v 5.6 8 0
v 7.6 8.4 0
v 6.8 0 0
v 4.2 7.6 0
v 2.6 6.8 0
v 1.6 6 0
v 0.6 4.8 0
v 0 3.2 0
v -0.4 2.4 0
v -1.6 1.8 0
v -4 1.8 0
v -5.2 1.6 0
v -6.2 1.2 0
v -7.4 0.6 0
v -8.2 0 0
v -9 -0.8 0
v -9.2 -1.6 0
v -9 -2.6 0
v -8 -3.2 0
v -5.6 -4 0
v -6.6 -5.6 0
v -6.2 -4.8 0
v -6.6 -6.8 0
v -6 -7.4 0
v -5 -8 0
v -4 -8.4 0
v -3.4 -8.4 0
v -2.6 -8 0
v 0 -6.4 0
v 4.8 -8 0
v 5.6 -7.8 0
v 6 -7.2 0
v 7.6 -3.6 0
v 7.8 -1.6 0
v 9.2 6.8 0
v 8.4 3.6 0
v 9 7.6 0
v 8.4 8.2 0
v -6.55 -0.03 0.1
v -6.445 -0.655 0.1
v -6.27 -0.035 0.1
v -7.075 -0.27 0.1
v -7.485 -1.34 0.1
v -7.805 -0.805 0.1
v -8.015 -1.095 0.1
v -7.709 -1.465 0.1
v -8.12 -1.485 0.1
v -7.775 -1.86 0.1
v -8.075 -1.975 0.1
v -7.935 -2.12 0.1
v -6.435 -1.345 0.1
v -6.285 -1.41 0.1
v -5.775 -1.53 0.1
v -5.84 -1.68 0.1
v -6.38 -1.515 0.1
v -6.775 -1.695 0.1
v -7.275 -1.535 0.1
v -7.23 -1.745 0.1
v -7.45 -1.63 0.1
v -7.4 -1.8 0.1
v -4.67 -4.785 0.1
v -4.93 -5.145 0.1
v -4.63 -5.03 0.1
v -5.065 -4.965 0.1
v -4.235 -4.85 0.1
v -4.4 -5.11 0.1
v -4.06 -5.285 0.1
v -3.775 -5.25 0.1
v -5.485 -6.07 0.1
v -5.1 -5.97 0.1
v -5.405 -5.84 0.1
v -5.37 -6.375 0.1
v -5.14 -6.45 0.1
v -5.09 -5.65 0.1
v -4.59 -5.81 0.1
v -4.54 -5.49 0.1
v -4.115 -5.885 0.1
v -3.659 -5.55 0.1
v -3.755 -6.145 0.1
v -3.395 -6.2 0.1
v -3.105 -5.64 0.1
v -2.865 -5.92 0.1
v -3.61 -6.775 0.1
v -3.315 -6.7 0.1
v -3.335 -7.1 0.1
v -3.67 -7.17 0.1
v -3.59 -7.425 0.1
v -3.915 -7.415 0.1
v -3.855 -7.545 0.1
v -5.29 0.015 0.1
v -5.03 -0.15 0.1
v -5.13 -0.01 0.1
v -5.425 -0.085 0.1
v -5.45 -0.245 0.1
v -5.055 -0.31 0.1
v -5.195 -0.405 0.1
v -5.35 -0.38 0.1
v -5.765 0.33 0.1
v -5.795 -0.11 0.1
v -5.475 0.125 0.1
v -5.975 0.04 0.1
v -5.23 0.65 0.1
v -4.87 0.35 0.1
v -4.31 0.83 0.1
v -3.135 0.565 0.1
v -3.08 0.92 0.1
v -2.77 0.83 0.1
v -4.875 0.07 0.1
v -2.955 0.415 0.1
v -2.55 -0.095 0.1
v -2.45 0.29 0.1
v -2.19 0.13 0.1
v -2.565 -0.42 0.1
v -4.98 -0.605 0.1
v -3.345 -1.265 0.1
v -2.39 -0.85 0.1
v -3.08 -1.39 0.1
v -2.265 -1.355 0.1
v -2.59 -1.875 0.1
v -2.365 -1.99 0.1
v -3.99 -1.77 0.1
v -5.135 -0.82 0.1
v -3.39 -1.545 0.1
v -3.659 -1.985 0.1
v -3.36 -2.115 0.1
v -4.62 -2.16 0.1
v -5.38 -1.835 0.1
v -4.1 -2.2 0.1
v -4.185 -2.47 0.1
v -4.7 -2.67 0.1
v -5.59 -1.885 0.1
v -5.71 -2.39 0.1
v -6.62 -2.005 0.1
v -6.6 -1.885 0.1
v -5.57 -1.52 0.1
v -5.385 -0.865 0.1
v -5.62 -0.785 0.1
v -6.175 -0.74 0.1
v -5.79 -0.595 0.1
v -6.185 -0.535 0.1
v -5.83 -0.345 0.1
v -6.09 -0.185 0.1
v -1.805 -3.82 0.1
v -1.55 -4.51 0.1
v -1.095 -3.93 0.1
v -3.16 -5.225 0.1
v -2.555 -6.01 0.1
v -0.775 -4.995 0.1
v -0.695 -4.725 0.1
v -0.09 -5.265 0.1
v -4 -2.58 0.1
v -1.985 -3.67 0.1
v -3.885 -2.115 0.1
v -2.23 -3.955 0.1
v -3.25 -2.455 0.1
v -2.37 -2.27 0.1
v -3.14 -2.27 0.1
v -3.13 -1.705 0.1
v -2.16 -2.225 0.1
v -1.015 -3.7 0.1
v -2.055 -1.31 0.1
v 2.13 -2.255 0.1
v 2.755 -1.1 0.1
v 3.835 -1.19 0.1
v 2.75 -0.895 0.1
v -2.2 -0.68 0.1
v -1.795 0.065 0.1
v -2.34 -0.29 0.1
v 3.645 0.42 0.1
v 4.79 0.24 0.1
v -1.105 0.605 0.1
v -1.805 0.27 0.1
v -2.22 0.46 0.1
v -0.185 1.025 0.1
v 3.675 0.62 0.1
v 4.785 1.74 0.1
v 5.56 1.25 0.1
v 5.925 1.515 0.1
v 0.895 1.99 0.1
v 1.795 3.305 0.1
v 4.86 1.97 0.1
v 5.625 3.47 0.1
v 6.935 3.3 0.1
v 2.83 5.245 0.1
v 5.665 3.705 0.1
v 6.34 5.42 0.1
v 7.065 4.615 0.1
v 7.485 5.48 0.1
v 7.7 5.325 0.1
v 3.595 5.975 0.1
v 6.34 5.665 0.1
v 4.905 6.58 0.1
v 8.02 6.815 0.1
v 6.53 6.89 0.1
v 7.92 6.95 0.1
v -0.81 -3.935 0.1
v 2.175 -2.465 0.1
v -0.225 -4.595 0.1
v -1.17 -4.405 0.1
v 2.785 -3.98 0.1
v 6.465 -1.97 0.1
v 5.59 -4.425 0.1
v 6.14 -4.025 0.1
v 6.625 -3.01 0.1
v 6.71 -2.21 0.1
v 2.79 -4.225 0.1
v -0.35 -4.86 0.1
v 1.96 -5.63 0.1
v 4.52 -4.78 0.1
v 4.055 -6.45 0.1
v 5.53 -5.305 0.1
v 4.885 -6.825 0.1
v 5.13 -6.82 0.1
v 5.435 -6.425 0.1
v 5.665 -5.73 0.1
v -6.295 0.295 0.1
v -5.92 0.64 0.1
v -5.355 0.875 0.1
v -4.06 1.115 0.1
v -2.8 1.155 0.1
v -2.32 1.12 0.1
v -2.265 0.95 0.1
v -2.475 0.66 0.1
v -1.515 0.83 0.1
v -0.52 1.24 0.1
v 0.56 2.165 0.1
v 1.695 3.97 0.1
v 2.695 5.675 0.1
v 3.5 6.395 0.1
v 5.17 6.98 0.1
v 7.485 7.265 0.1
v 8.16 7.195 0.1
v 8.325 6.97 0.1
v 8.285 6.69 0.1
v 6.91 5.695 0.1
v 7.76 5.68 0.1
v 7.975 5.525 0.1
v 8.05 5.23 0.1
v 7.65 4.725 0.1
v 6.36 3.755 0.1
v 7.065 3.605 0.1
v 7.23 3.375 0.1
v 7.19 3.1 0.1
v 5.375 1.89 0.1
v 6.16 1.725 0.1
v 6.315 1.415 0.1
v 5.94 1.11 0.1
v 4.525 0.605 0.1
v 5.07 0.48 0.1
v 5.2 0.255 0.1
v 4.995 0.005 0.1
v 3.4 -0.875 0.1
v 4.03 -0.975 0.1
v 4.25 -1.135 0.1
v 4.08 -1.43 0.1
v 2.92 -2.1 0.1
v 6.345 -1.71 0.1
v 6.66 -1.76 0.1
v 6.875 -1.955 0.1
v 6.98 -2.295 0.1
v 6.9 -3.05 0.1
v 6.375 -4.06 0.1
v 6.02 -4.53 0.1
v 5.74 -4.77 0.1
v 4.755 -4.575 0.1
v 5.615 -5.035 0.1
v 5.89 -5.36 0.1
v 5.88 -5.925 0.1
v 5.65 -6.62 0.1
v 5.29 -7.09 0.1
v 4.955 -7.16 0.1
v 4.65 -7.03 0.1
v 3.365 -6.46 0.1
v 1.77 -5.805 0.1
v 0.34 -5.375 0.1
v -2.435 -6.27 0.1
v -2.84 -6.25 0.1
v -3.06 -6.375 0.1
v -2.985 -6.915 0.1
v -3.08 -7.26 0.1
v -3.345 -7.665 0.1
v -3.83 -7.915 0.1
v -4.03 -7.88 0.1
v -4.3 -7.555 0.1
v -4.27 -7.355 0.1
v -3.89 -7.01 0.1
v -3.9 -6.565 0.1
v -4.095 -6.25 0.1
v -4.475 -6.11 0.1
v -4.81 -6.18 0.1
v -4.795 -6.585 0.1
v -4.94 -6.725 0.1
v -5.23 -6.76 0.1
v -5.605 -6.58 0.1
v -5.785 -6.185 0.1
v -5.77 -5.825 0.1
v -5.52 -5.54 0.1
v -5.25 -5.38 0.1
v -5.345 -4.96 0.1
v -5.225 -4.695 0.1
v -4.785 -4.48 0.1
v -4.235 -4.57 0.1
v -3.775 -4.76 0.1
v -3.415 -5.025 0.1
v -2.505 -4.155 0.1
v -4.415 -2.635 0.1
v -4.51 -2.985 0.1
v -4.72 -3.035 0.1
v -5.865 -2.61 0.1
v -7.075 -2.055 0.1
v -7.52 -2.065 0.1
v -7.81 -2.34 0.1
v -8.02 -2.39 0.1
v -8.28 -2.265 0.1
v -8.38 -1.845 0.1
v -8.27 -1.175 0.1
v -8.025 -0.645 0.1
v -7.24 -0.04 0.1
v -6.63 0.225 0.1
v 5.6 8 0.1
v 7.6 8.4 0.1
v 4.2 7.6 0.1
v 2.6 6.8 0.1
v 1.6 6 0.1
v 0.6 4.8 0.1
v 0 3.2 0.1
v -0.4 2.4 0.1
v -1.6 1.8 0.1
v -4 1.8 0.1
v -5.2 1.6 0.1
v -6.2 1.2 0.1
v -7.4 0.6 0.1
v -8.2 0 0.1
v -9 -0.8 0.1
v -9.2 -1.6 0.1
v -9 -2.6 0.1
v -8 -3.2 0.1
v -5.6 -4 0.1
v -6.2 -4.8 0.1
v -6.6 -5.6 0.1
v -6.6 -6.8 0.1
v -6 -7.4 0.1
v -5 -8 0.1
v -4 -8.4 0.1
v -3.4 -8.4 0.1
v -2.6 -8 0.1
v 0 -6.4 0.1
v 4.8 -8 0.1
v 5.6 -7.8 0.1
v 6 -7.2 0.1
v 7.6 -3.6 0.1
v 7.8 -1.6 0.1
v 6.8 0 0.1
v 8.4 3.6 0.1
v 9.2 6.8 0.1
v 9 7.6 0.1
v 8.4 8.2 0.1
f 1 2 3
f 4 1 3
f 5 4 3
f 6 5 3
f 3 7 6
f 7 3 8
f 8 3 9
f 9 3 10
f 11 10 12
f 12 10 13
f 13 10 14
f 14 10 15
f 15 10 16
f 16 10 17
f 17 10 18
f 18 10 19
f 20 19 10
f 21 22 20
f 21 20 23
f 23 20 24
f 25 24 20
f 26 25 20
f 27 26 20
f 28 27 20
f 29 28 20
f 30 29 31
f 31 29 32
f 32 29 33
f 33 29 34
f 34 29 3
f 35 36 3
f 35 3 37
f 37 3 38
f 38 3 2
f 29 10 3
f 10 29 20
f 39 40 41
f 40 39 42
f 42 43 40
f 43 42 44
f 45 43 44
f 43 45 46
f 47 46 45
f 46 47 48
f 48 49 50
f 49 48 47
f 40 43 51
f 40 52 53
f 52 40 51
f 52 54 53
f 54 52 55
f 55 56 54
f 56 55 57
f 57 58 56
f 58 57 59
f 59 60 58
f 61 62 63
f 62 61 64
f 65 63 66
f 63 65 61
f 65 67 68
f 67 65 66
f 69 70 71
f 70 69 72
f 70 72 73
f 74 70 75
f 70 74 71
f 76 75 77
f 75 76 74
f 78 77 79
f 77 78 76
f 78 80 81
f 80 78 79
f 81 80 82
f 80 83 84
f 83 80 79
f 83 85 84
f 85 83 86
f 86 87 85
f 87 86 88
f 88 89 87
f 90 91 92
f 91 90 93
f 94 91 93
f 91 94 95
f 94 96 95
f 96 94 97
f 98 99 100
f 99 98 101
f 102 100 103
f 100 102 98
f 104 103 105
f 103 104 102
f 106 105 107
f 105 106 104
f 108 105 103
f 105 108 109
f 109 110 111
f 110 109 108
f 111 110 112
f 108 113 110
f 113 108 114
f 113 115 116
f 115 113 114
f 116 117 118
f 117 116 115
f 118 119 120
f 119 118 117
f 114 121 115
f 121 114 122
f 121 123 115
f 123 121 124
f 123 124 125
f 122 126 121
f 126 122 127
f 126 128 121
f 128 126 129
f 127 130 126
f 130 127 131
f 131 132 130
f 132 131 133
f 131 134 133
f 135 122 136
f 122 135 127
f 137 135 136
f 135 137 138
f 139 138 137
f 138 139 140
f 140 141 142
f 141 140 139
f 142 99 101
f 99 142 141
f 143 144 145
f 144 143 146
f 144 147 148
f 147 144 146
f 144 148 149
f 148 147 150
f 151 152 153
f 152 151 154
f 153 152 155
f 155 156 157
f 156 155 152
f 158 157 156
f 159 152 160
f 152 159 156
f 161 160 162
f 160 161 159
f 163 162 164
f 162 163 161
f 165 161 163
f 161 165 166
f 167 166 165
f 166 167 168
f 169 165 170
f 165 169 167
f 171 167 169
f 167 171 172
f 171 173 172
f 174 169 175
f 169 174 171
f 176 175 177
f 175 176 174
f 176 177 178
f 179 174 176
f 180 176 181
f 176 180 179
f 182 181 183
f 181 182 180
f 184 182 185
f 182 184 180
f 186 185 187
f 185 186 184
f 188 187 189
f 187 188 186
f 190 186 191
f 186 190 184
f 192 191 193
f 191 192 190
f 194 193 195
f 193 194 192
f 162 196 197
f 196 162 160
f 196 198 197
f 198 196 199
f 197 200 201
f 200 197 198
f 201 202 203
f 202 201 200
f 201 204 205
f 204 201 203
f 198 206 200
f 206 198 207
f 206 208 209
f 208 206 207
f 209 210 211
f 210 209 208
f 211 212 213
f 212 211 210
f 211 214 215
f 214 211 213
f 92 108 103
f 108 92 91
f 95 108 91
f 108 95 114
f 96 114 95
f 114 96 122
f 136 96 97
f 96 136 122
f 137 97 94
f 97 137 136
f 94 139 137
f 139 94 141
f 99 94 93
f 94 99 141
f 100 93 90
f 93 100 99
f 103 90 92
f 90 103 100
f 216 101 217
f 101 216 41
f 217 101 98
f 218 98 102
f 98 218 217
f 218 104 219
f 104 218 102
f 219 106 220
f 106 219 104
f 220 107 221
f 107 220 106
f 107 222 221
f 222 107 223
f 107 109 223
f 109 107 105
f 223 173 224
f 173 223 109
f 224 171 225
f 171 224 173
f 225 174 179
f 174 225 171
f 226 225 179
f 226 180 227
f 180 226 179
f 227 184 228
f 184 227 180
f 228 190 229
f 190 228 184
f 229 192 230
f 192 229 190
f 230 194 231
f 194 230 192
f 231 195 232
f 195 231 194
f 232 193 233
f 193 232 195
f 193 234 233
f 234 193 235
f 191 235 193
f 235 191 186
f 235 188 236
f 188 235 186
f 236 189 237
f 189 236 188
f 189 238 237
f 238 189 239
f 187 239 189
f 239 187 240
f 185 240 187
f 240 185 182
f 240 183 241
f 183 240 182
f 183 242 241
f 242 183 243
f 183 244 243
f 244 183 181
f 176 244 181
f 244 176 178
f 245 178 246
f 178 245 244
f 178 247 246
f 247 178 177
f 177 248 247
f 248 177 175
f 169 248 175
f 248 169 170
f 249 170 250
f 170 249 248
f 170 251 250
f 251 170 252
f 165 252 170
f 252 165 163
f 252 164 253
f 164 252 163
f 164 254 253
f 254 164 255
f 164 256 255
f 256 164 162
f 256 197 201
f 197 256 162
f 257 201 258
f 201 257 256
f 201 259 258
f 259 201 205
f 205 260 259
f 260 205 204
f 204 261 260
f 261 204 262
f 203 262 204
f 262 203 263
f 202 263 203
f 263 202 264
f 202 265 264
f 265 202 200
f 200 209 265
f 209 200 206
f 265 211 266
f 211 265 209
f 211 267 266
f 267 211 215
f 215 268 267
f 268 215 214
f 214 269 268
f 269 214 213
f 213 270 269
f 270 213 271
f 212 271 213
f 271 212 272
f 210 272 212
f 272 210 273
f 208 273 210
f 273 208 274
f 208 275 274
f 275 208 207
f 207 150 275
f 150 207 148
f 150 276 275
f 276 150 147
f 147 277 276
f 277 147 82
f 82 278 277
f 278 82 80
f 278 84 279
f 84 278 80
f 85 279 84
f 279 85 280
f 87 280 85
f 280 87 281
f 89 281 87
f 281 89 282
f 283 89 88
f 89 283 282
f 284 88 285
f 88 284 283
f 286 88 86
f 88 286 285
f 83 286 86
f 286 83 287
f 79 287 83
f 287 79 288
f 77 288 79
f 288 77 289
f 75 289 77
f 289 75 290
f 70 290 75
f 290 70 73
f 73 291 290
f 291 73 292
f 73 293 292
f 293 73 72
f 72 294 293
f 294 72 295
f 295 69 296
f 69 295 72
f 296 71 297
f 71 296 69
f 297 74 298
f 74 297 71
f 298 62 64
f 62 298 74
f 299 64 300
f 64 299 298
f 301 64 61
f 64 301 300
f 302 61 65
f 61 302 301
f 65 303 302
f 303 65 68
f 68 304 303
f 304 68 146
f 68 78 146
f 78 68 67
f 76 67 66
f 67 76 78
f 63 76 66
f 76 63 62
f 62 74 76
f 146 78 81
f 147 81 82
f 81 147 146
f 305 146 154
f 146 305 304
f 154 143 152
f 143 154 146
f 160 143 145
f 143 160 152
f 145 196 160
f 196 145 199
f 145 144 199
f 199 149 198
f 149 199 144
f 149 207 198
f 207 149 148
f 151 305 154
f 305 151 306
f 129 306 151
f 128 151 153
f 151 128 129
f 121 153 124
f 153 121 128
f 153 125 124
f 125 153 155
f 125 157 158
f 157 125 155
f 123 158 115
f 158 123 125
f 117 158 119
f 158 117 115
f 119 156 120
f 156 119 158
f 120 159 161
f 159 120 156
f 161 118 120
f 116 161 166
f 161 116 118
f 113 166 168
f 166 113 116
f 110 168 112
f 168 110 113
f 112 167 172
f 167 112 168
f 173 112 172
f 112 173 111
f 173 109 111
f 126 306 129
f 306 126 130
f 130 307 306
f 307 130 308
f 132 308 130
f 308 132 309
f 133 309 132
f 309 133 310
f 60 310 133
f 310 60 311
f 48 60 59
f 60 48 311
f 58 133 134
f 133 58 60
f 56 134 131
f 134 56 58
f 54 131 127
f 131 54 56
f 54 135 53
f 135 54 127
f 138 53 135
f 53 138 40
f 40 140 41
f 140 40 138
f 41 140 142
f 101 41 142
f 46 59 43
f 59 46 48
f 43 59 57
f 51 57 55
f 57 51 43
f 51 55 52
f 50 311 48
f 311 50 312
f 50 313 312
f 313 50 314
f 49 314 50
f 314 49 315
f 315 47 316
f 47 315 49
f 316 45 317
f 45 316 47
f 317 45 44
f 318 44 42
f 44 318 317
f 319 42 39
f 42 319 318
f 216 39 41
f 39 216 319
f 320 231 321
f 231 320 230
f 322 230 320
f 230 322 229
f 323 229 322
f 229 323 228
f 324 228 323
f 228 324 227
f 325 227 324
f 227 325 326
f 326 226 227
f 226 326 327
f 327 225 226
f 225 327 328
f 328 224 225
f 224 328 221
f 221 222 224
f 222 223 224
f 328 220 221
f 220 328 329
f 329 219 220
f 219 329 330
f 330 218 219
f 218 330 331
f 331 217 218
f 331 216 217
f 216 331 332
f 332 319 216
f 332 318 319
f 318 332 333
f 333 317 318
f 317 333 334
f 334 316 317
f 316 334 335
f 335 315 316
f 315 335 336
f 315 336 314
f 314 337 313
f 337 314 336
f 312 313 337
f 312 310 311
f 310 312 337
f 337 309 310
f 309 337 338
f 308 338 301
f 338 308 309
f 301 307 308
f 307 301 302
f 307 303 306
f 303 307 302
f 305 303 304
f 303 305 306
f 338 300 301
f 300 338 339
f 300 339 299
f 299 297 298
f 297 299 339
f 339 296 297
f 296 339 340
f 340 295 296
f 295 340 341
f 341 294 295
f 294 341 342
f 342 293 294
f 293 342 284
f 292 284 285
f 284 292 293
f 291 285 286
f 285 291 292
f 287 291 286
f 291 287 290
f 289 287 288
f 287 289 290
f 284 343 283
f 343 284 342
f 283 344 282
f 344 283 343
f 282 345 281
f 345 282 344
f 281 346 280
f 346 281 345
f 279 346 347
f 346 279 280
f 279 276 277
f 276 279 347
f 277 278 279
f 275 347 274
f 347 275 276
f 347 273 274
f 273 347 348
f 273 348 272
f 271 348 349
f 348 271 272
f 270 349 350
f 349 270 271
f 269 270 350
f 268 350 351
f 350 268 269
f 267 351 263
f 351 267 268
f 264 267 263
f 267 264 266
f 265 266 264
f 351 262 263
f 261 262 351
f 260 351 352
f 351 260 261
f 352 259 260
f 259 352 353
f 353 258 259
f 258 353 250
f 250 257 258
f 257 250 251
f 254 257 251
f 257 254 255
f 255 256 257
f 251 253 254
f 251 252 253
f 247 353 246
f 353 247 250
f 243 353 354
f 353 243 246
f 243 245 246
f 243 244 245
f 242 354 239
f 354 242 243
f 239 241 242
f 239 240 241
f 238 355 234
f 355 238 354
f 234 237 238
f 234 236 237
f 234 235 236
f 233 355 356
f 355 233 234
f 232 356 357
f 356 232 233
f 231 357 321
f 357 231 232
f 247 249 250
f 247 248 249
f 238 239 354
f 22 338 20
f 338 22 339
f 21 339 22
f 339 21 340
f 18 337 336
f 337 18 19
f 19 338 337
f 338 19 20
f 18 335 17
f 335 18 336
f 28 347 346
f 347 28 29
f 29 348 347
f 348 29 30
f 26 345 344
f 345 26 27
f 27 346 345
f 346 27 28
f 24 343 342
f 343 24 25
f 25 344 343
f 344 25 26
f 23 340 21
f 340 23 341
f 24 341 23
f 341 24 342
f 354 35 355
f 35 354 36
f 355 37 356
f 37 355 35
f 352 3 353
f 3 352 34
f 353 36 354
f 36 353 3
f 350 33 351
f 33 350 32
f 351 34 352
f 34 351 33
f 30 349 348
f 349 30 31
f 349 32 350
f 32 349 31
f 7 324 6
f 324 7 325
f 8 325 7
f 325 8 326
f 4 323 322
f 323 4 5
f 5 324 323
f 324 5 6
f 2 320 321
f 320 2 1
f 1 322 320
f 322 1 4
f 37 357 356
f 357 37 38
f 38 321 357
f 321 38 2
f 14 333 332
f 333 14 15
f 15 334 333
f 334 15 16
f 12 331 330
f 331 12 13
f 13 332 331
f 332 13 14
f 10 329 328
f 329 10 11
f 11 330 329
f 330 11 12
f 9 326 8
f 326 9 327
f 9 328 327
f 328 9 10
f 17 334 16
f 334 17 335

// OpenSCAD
use <../lib.scad>
use <s/821409bs01.scad>
function ldraw_lib__821409c() = [
// 0 Sticker  2.1 x  2.3 with Blue Eagle Facing Left
// 0 Name: 821409c.dat
// 0 Author: Takeshi Takahashi [RainbowDolphin]
// 0 !LDRAW_ORG Part UPDATE 2024-10
// 0 !LICENSE Licensed under CC BY 4.0 : see CAreadme.txt
// 
// 0 BFC CERTIFY CCW
  [0,"BFC","CERTIFY"],
  [0,"BFC","CCW"],
// 
// 0 !KEYWORDS Aerial Acrobats, Set 6345
// 
// 0 !HISTORY 2024-12-01 [OrionP] Official Update 2024-10
// 
// 3 16 14 0 20 19 0 21 17 0 0
  [3,16,14,0,20,19,0,21,17,0,0],
// 3 16 10.5 0 19 14 0 20 17 0 0
  [3,16,10.5,0,19,14,0,20,17,0,0],
// 3 16 6.5 0 17 10.5 0 19 17 0 0
  [3,16,6.5,0,17,10.5,0,19,17,0,0],
// 3 16 4 0 15 6.5 0 17 17 0 0
  [3,16,4,0,15,6.5,0,17,17,0,0],
// 4 16 1.5 0 12 4 0 15 17 0 0 0 0 8
  [4,16,1.5,0,12,4,0,15,17,0,0,0,0,8],
// 3 16 0 0 8 17 0 0 -1 0 6
  [3,16,0,0,8,17,0,0,-1,0,6],
// 3 16 -1 0 6 17 0 0 -4 0 4.5
  [3,16,-1,0,6,17,0,0,-4,0,4.5],
// 3 16 -10 0 4.5 -4 0 4.5 -13 0 4
  [3,16,-10,0,4.5,-4,0,4.5,-13,0,4],
// 3 16 -13 0 4 -4 0 4.5 -15.5 0 3
  [3,16,-13,0,4,-4,0,4.5,-15.5,0,3],
// 3 16 -15.5 0 3 -4 0 4.5 -18.5 0 1.5
  [3,16,-15.5,0,3,-4,0,4.5,-18.5,0,1.5],
// 3 16 -18.5 0 1.5 -4 0 4.5 -20.5 0 0
  [3,16,-18.5,0,1.5,-4,0,4.5,-20.5,0,0],
// 3 16 -20.5 0 0 -4 0 4.5 -22.5 0 -2
  [3,16,-20.5,0,0,-4,0,4.5,-22.5,0,-2],
// 3 16 -22.5 0 -2 -4 0 4.5 -23 0 -4
  [3,16,-22.5,0,-2,-4,0,4.5,-23,0,-4],
// 3 16 -23 0 -4 -4 0 4.5 -22.5 0 -6.5
  [3,16,-23,0,-4,-4,0,4.5,-22.5,0,-6.5],
// 3 16 -22.5 0 -6.5 -4 0 4.5 -20 0 -8
  [3,16,-22.5,0,-6.5,-4,0,4.5,-20,0,-8],
// 3 16 -14 0 -10 -20 0 -8 -4 0 4.5
  [3,16,-14,0,-10,-20,0,-8,-4,0,4.5],
// 3 16 -16.5 0 -14 -15.5 0 -12 -14 0 -10
  [3,16,-16.5,0,-14,-15.5,0,-12,-14,0,-10],
// 3 16 -16.5 0 -14 -14 0 -10 -16.5 0 -17
  [3,16,-16.5,0,-14,-14,0,-10,-16.5,0,-17],
// 3 16 -16.5 0 -17 -14 0 -10 -15 0 -18.5
  [3,16,-16.5,0,-17,-14,0,-10,-15,0,-18.5],
// 3 16 -12.5 0 -20 -15 0 -18.5 -14 0 -10
  [3,16,-12.5,0,-20,-15,0,-18.5,-14,0,-10],
// 3 16 -10 0 -21 -12.5 0 -20 -14 0 -10
  [3,16,-10,0,-21,-12.5,0,-20,-14,0,-10],
// 3 16 -8.5 0 -21 -10 0 -21 -14 0 -10
  [3,16,-8.5,0,-21,-10,0,-21,-14,0,-10],
// 3 16 -6.5 0 -20 -8.5 0 -21 -14 0 -10
  [3,16,-6.5,0,-20,-8.5,0,-21,-14,0,-10],
// 3 16 0 0 -16 -6.5 0 -20 -14 0 -10
  [3,16,0,0,-16,-6.5,0,-20,-14,0,-10],
// 3 16 12 0 -20 0 0 -16 14 0 -19.5
  [3,16,12,0,-20,0,0,-16,14,0,-19.5],
// 3 16 14 0 -19.5 0 0 -16 15 0 -18
  [3,16,14,0,-19.5,0,0,-16,15,0,-18],
// 3 16 15 0 -18 0 0 -16 19 0 -9
  [3,16,15,0,-18,0,0,-16,19,0,-9],
// 3 16 19 0 -9 0 0 -16 19.5 0 -4
  [3,16,19,0,-9,0,0,-16,19.5,0,-4],
// 3 16 19.5 0 -4 0 0 -16 17 0 0
  [3,16,19.5,0,-4,0,0,-16,17,0,0],
// 3 16 23 0 17 21 0 9 17 0 0
  [3,16,23,0,17,21,0,9,17,0,0],
// 3 16 23 0 17 17 0 0 22.5 0 19
  [3,16,23,0,17,17,0,0,22.5,0,19],
// 3 16 22.5 0 19 17 0 0 21 0 20.5
  [3,16,22.5,0,19,17,0,0,21,0,20.5],
// 3 16 21 0 20.5 17 0 0 19 0 21
  [3,16,21,0,20.5,17,0,0,19,0,21],
// 4 16 17 0 0 0 0 -16 -14 0 -10 -4 0 4.5
  [4,16,17,0,0,0,0,-16,-14,0,-10,-4,0,4.5],
// 0 BFC NOCLIP
  [0,"BFC","NOCLIP"],
// 1 16 1 -.25 0 1.25 0 0 0 1 0 0 0 1.25 s\821409bs01.dat
  [1,16,1,-.25,0,1.25,0,0,0,1,0,0,0,1.25, ldraw_lib__s__821409bs01()],
// 0 BFC CLIP
  [0,"BFC","CLIP"],
// 4 16 18.7125 -.25 18.1625 19 -.25 21 14 -.25 20 12.925 -.25 17.45
  [4,16,18.7125,-.25,18.1625,19,-.25,21,14,-.25,20,12.925,-.25,17.45],
// 4 16 12.925 -.25 17.45 14 -.25 20 10.5 -.25 19 8.75 -.25 15.9875
  [4,16,12.925,-.25,17.45,14,-.25,20,10.5,-.25,19,8.75,-.25,15.9875],
// 4 16 8.75 -.25 15.9875 10.5 -.25 19 6.5 -.25 17 6.7375 -.25 14.1875
  [4,16,8.75,-.25,15.9875,10.5,-.25,19,6.5,-.25,17,6.7375,-.25,14.1875],
// 4 16 6.7375 -.25 14.1875 6.5 -.25 17 4 -.25 15 4.2375 -.25 9.925
  [4,16,6.7375,-.25,14.1875,6.5,-.25,17,4,-.25,15,4.2375,-.25,9.925],
// 4 16 4.2375 -.25 9.925 4 -.25 15 1.5 -.25 12 0 -.25 8
  [4,16,4.2375,-.25,9.925,4,-.25,15,1.5,-.25,12,0,-.25,8],
// 4 16 1.4 -.25 5.4125 4.2375 -.25 9.925 0 -.25 8 -1 -.25 6
  [4,16,1.4,-.25,5.4125,4.2375,-.25,9.925,0,-.25,8,-1,-.25,6],
// 4 16 -1.3 -.25 3.1 1.4 -.25 5.4125 -1 -.25 6 -4 -.25 4.5
  [4,16,-1.3,-.25,3.1,1.4,-.25,5.4125,-1,-.25,6,-4,-.25,4.5],
// 4 16 -3.7875 -.25 2.075 -1.3 -.25 3.1 -4 -.25 4.5 -5.8 -.25 2.8
  [4,16,-3.7875,-.25,2.075,-1.3,-.25,3.1,-4,-.25,4.5,-5.8,-.25,2.8],
// 3 16 -5.8 -.25 2.8 -5.6625 -.25 2.375 -3.7875 -.25 2.075
  [3,16,-5.8,-.25,2.8,-5.6625,-.25,2.375,-3.7875,-.25,2.075],
// 3 16 -5.6625 -.25 2.375 -6.1875 -.25 1.65 -3.7875 -.25 2.075
  [3,16,-5.6625,-.25,2.375,-6.1875,-.25,1.65,-3.7875,-.25,2.075],
// 4 16 -7 -.25 2.8875 -5.8 -.25 2.8 -4 -.25 4.5 -10 -.25 4.5
  [4,16,-7,-.25,2.8875,-5.8,-.25,2.8,-4,-.25,4.5,-10,-.25,4.5],
// 4 16 -10.15 -.25 2.7875 -7 -.25 2.8875 -10 -.25 4.5 -13 -.25 4
  [4,16,-10.15,-.25,2.7875,-7,-.25,2.8875,-10,-.25,4.5,-13,-.25,4],
// 4 16 -13.3875 -.25 2.1875 -10.15 -.25 2.7875 -13 -.25 4 -15.5 -.25 3
  [4,16,-13.3875,-.25,2.1875,-10.15,-.25,2.7875,-13,-.25,4,-15.5,-.25,3],
// 3 16 -15.5 -.25 3 -14.8 -.25 1.6 -13.3875 -.25 2.1875
  [3,16,-15.5,-.25,3,-14.8,-.25,1.6,-13.3875,-.25,2.1875],
// 4 16 -15.7375 -.25 .7375 -14.8 -.25 1.6 -15.5 -.25 3 -18.5 -.25 1.5
  [4,16,-15.7375,-.25,.7375,-14.8,-.25,1.6,-15.5,-.25,3,-18.5,-.25,1.5],
// 3 16 -18.5 -.25 1.5 -16.575 -.25 .5625 -15.7375 -.25 .7375
  [3,16,-18.5,-.25,1.5,-16.575,-.25,.5625,-15.7375,-.25,.7375],
// 4 16 -18.1 -.25 -.1 -16.575 -.25 .5625 -18.5 -.25 1.5 -20.5 -.25 0
  [4,16,-18.1,-.25,-.1,-16.575,-.25,.5625,-18.5,-.25,1.5,-20.5,-.25,0],
// 4 16 -20.0625 -.25 -1.6125 -18.1 -.25 -.1 -20.5 -.25 0 -22.5 -.25 -2
  [4,16,-20.0625,-.25,-1.6125,-18.1,-.25,-.1,-20.5,-.25,0,-22.5,-.25,-2],
// 4 16 -20.675 -.25 -2.9375 -20.0625 -.25 -1.6125 -22.5 -.25 -2 -23 -.25 -4
  [4,16,-20.675,-.25,-2.9375,-20.0625,-.25,-1.6125,-22.5,-.25,-2,-23,-.25,-4],
// 4 16 -20.95 -.25 -4.6125 -20.675 -.25 -2.9375 -23 -.25 -4 -22.5 -.25 -6.5
  [4,16,-20.95,-.25,-4.6125,-20.675,-.25,-2.9375,-23,-.25,-4,-22.5,-.25,-6.5],
// 3 16 -20.95 -.25 -4.6125 -22.5 -.25 -6.5 -20.7 -.25 -5.6625
  [3,16,-20.95,-.25,-4.6125,-22.5,-.25,-6.5,-20.7,-.25,-5.6625],
// 4 16 -20.05 -.25 -5.975 -20.7 -.25 -5.6625 -22.5 -.25 -6.5 -20 -.25 -8
  [4,16,-20.05,-.25,-5.975,-20.7,-.25,-5.6625,-22.5,-.25,-6.5,-20,-.25,-8],
// 3 16 -19.525 -.25 -5.85 -20.05 -.25 -5.975 -20 -.25 -8
  [3,16,-19.525,-.25,-5.85,-20.05,-.25,-5.975,-20,-.25,-8],
// 4 16 -18.8 -.25 -5.1625 -19.525 -.25 -5.85 -20 -.25 -8 -17.6875 -.25 -5.1375
  [4,16,-18.8,-.25,-5.1625,-19.525,-.25,-5.85,-20,-.25,-8,-17.6875,-.25,-5.1375],
// 4 16 -17.6875 -.25 -5.1375 -20 -.25 -8 -14 -.25 -10 -14.6625 -.25 -6.525
  [4,16,-17.6875,-.25,-5.1375,-20,-.25,-8,-14,-.25,-10,-14.6625,-.25,-6.525],
// 4 16 -11.8 -.25 -7.5875 -14.6625 -.25 -6.525 -14 -.25 -10 -11.9625 -.25 -11.2
  [4,16,-11.8,-.25,-7.5875,-14.6625,-.25,-6.525,-14,-.25,-10,-11.9625,-.25,-11.2],
// 4 16 -11.275 -.25 -7.4625 -11.8 -.25 -7.5875 -11.9625 -.25 -11.2 -10.5875 -.25 -11.425
  [4,16,-11.275,-.25,-7.4625,-11.8,-.25,-7.5875,-11.9625,-.25,-11.2,-10.5875,-.25,-11.425],
// 4 16 -11.0375 -.25 -6.5875 -11.275 -.25 -7.4625 -10.5875 -.25 -11.425 -9.4375 -.25 -11.9
  [4,16,-11.0375,-.25,-6.5875,-11.275,-.25,-7.4625,-10.5875,-.25,-11.425,-9.4375,-.25,-11.9],
// 4 16 -6.2625 -.25 -10.3875 -11.0375 -.25 -6.5875 -9.4375 -.25 -11.9 -8.5375 -.25 -12.5625
  [4,16,-6.2625,-.25,-10.3875,-11.0375,-.25,-6.5875,-9.4375,-.25,-11.9,-8.5375,-.25,-12.5625],
// 4 16 -13.0625 -.25 -11.7375 -11.9625 -.25 -11.2 -14 -.25 -10 -15.5 -.25 -12
  [4,16,-13.0625,-.25,-11.7375,-11.9625,-.25,-11.2,-14,-.25,-10,-15.5,-.25,-12],
// 3 16 -13.0625 -.25 -11.7375 -15.5 -.25 -12 -13.3625 -.25 -12.4
  [3,16,-13.0625,-.25,-11.7375,-15.5,-.25,-12,-13.3625,-.25,-12.4],
// 4 16 -13.125 -.25 -13.45 -13.3625 -.25 -12.4 -15.5 -.25 -12 -13.8 -.25 -13.85
  [4,16,-13.125,-.25,-13.45,-13.3625,-.25,-12.4,-15.5,-.25,-12,-13.8,-.25,-13.85],
// 4 16 -13.8 -.25 -13.85 -15.5 -.25 -12 -16.5 -.25 -14 -14.425 -.25 -14.5625
  [4,16,-13.8,-.25,-13.85,-15.5,-.25,-12,-16.5,-.25,-14,-14.425,-.25,-14.5625],
// 4 16 -14.4625 -.25 -15.4625 -14.425 -.25 -14.5625 -16.5 -.25 -14 -16.5 -.25 -17
  [4,16,-14.4625,-.25,-15.4625,-14.425,-.25,-14.5625,-16.5,-.25,-14,-16.5,-.25,-17],
// 4 16 -14.0125 -.25 -16.45 -14.4625 -.25 -15.4625 -16.5 -.25 -17 -15 -.25 -18.5
  [4,16,-14.0125,-.25,-16.45,-14.4625,-.25,-15.4625,-16.5,-.25,-17,-15,-.25,-18.5],
// 4 16 -13.075 -.25 -16.9 -14.0125 -.25 -16.45 -15 -.25 -18.5 -10.75 -.25 -18.8875
  [4,16,-13.075,-.25,-16.9,-14.0125,-.25,-16.45,-15,-.25,-18.5,-10.75,-.25,-18.8875],
// 4 16 -13.075 -.25 -16.9 -10.75 -.25 -18.8875 -10.675 -.25 -18.3875 -12.35 -.25 -16.8125
  [4,16,-13.075,-.25,-16.9,-10.75,-.25,-18.8875,-10.675,-.25,-18.3875,-12.35,-.25,-16.8125],
// 4 16 -12.35 -.25 -16.8125 -10.675 -.25 -18.3875 -9.725 -.25 -17.525 -11.9875 -.25 -16.4625
  [4,16,-12.35,-.25,-16.8125,-10.675,-.25,-18.3875,-9.725,-.25,-17.525,-11.9875,-.25,-16.4625],
// 4 16 -11.9875 -.25 -16.4625 -9.725 -.25 -17.525 -9.75 -.25 -16.4125 -12.025 -.25 -15.45
  [4,16,-11.9875,-.25,-16.4625,-9.725,-.25,-17.525,-9.75,-.25,-16.4125,-12.025,-.25,-15.45],
// 4 16 -12.025 -.25 -15.45 -9.75 -.25 -16.4125 -10.2375 -.25 -15.625 -11.1875 -.25 -15.275
  [4,16,-12.025,-.25,-15.45,-9.75,-.25,-16.4125,-10.2375,-.25,-15.625,-11.1875,-.25,-15.275],
// 4 16 -10.75 -.25 -18.8875 -15 -.25 -18.5 -12.5 -.25 -20 -10.075 -.25 -19.7
  [4,16,-10.75,-.25,-18.8875,-15,-.25,-18.5,-12.5,-.25,-20,-10.075,-.25,-19.7],
// 4 16 -10.075 -.25 -19.7 -12.5 -.25 -20 -10 -.25 -21 -9.575 -.25 -19.7875
  [4,16,-10.075,-.25,-19.7,-12.5,-.25,-20,-10,-.25,-21,-9.575,-.25,-19.7875],
// 4 16 -9.575 -.25 -19.7875 -10 -.25 -21 -8.5 -.25 -21 -8.3625 -.25 -19.1625
  [4,16,-9.575,-.25,-19.7875,-10,-.25,-21,-8.5,-.25,-21,-8.3625,-.25,-19.1625],
// 4 16 -8.3625 -.25 -19.1625 -8.5 -.25 -21 -6.5 -.25 -20 -7.7 -.25 -18.15
  [4,16,-8.3625,-.25,-19.1625,-8.5,-.25,-21,-6.5,-.25,-20,-7.7,-.25,-18.15],
// 4 16 -7.7 -.25 -18.15 -6.5 -.25 -20 0 -.25 -16 -7.4625 -.25 -17.2875
  [4,16,-7.7,-.25,-18.15,-6.5,-.25,-20,0,-.25,-16,-7.4625,-.25,-17.2875],
// 4 16 -7.4625 -.25 -17.2875 0 -.25 -16 -6.0875 -.25 -15.675 -7.1 -.25 -15.625
  [4,16,-7.4625,-.25,-17.2875,0,-.25,-16,-6.0875,-.25,-15.675,-7.1,-.25,-15.625],
// 3 16 -7.1 -.25 -15.625 -7.65 -.25 -15.9375 -7.4625 -.25 -17.2875
  [3,16,-7.1,-.25,-15.625,-7.65,-.25,-15.9375,-7.4625,-.25,-17.2875],
// 4 16 .85 -.25 -13.4375 -6.0875 -.25 -15.675 0 -.25 -16 4.425 -.25 -14.5125
  [4,16,.85,-.25,-13.4375,-6.0875,-.25,-15.675,0,-.25,-16,4.425,-.25,-14.5125],
// 4 16 4.425 -.25 -14.5125 0 -.25 -16 12 -.25 -20 8.4125 -.25 -16.15
  [4,16,4.425,-.25,-14.5125,0,-.25,-16,12,-.25,-20,8.4125,-.25,-16.15],
// 3 16 8.4125 -.25 -16.15 12 -.25 -20 11.625 -.25 -17.575
  [3,16,8.4125,-.25,-16.15,12,-.25,-20,11.625,-.25,-17.575],
// 4 16 12.3875 -.25 -17.9 11.625 -.25 -17.575 12 -.25 -20 14 -.25 -19.5
  [4,16,12.3875,-.25,-17.9,11.625,-.25,-17.575,12,-.25,-20,14,-.25,-19.5],
// 4 16 13.225 -.25 -17.725 12.3875 -.25 -17.9 14 -.25 -19.5 15 -.25 -18
  [4,16,13.225,-.25,-17.725,12.3875,-.25,-17.9,14,-.25,-19.5,15,-.25,-18],
// 3 16 14.125 -.25 -16.55 13.225 -.25 -17.725 15 -.25 -18
  [3,16,14.125,-.25,-16.55,13.225,-.25,-17.725,15,-.25,-18],
// 4 16 14.7 -.25 -14.8125 14.125 -.25 -16.55 15 -.25 -18 19 -.25 -9
  [4,16,14.7,-.25,-14.8125,14.125,-.25,-16.55,15,-.25,-18,19,-.25,-9],
// 4 16 14.725 -.25 -13.4 14.7 -.25 -14.8125 19 -.25 -9 15.05 -.25 -11.325
  [4,16,14.725,-.25,-13.4,14.7,-.25,-14.8125,19,-.25,-9,15.05,-.25,-11.325],
// 4 16 14.725 -.25 -13.4 15.05 -.25 -11.325 14.35 -.25 -11.925 14.0375 -.25 -12.5875
  [4,16,14.725,-.25,-13.4,15.05,-.25,-11.325,14.35,-.25,-11.925,14.0375,-.25,-12.5875],
// 3 16 11.8875 -.25 -11.4375 14.0375 -.25 -12.5875 14.35 -.25 -11.925
  [3,16,11.8875,-.25,-11.4375,14.0375,-.25,-12.5875,14.35,-.25,-11.925],
// 3 16 19 -.25 -9 15.9375 -.25 -10.14875 15.05 -.25 -11.325
  [3,16,19,-.25,-9,15.9375,-.25,-10.14875,15.05,-.25,-11.325],
// 3 16 17.25 -.25 -7.625 15.9375 -.25 -10.14875 19 -.25 -9
  [3,16,17.25,-.25,-7.625,15.9375,-.25,-10.14875,19,-.25,-9],
// 4 16 17.45 -.25 -5.7375 17.25 -.25 -7.625 19 -.25 -9 19.5 -.25 -4
  [4,16,17.45,-.25,-5.7375,17.25,-.25,-7.625,19,-.25,-9,19.5,-.25,-4],
// 4 16 17.1875 -.25 -4.8875 17.45 -.25 -5.7375 19.5 -.25 -4 17 -.25 0
  [4,16,17.1875,-.25,-4.8875,17.45,-.25,-5.7375,19.5,-.25,-4,17,-.25,0],
// 4 16 16.65 -.25 -4.4 17.1875 -.25 -4.8875 17 -.25 0 13 -.25 .6375
  [4,16,16.65,-.25,-4.4,17.1875,-.25,-4.8875,17,-.25,0,13,-.25,.6375],
// 4 16 15.8625 -.25 -4.275 16.65 -.25 -4.4 13 -.25 .6375 12.4875 -.25 .0125
  [4,16,15.8625,-.25,-4.275,16.65,-.25,-4.4,13,-.25,.6375,12.4875,-.25,.0125],
// 4 16 15.8625 -.25 -4.275 12.4875 -.25 .0125 10.625 -.25 -2.8375 10.2 -.25 -3.575
  [4,16,15.8625,-.25,-4.275,12.4875,-.25,.0125,10.625,-.25,-2.8375,10.2,-.25,-3.575],
// 3 16 10.2 -.25 -3.575 7.3 -.25 -5.25 15.8625 -.25 -4.275
  [3,16,10.2,-.25,-3.575,7.3,-.25,-5.25,15.8625,-.25,-4.275],
// 3 16 12.4875 -.25 .0125 10.075 -.25 -2.4375 10.625 -.25 -2.8375
  [3,16,12.4875,-.25,.0125,10.075,-.25,-2.4375,10.625,-.25,-2.8375],
// 3 16 12.4875 -.25 .0125 8.5 -.25 -2.1875 10.075 -.25 -2.4375
  [3,16,12.4875,-.25,.0125,8.5,-.25,-2.1875,10.075,-.25,-2.4375],
// 4 16 14.85 -.25 2.775 13 -.25 .6375 17 -.25 0 15.7875 -.25 3.5375
  [4,16,14.85,-.25,2.775,13,-.25,.6375,17,-.25,0,15.7875,-.25,3.5375],
// 4 16 17.975 -.25 7.75 15.7875 -.25 3.5375 17 -.25 0 21 -.25 9
  [4,16,17.975,-.25,7.75,15.7875,-.25,3.5375,17,-.25,0,21,-.25,9],
// 3 16 17.975 -.25 7.75 15.4 -.25 4.3125 15.7875 -.25 3.5375
  [3,16,17.975,-.25,7.75,15.4,-.25,4.3125,15.7875,-.25,3.5375],
// 3 16 17.975 -.25 7.75 13.4375 -.25 4.725 15.4 -.25 4.3125
  [3,16,17.975,-.25,7.75,13.4375,-.25,4.725,15.4,-.25,4.3125],
// 4 16 18.075 -.25 8.4375 17.975 -.25 7.75 21 -.25 9 19.125 -.25 11.8125
  [4,16,18.075,-.25,8.4375,17.975,-.25,7.75,21,-.25,9,19.125,-.25,11.8125],
// 3 16 19.125 -.25 11.8125 17.6625 -.25 9.0125 18.075 -.25 8.4375
  [3,16,19.125,-.25,11.8125,17.6625,-.25,9.0125,18.075,-.25,8.4375],
// 3 16 19.125 -.25 11.8125 15.9 -.25 9.3875 17.6625 -.25 9.0125
  [3,16,19.125,-.25,11.8125,15.9,-.25,9.3875,17.6625,-.25,9.0125],
// 4 16 20.125 -.25 13.075 21 -.25 9 23 -.25 17 20.7125 -.25 16.725
  [4,16,20.125,-.25,13.075,21,-.25,9,23,-.25,17,20.7125,-.25,16.725],
// 3 16 20.7125 -.25 16.725 19.9375 -.25 13.8125 20.125 -.25 13.075
  [3,16,20.7125,-.25,16.725,19.9375,-.25,13.8125,20.125,-.25,13.075],
// 3 16 20.7125 -.25 16.725 19.4 -.25 14.2 19.9375 -.25 13.8125
  [3,16,20.7125,-.25,16.725,19.4,-.25,14.2,19.9375,-.25,13.8125],
// 3 16 20.7125 -.25 16.725 17.275 -.25 14.2375 19.4 -.25 14.2
  [3,16,20.7125,-.25,16.725,17.275,-.25,14.2375,19.4,-.25,14.2],
// 4 16 20.8125 -.25 17.425 20.7125 -.25 16.725 23 -.25 17 22.5 -.25 19
  [4,16,20.8125,-.25,17.425,20.7125,-.25,16.725,23,-.25,17,22.5,-.25,19],
// 4 16 20.4 -.25 17.9875 20.8125 -.25 17.425 22.5 -.25 19 21 -.25 20.5
  [4,16,20.4,-.25,17.9875,20.8125,-.25,17.425,22.5,-.25,19,21,-.25,20.5],
// 4 16 18.7125 -.25 18.1625 20.4 -.25 17.9875 21 -.25 20.5 19 -.25 21
  [4,16,18.7125,-.25,18.1625,20.4,-.25,17.9875,21,-.25,20.5,19,-.25,21],
// 3 16 14.85 -.25 2.775 12.675 -.25 1.2 13 -.25 .6375
  [3,16,14.85,-.25,2.775,12.675,-.25,1.2,13,-.25,.6375],
// 3 16 14.85 -.25 2.775 11.3125 -.25 1.5125 12.675 -.25 1.2
  [3,16,14.85,-.25,2.775,11.3125,-.25,1.5125,12.675,-.25,1.2],
// 3 16 20.125 -.25 13.075 19.125 -.25 11.8125 21 -.25 9
  [3,16,20.125,-.25,13.075,19.125,-.25,11.8125,21,-.25,9],
// 
// 2 24 -14 -.25 -10 -14 0 -10
  [2,24,-14,-.25,-10,-14,0,-10],
// 4 16 -14 -.25 -10 -14 0 -10 -15.5 0 -12 -15.5 -.25 -12
  [4,16,-14,-.25,-10,-14,0,-10,-15.5,0,-12,-15.5,-.25,-12],
// 4 16 -15.5 -.25 -12 -15.5 0 -12 -16.5 0 -14 -16.5 -.25 -14
  [4,16,-15.5,-.25,-12,-15.5,0,-12,-16.5,0,-14,-16.5,-.25,-14],
// 4 16 -22.5 -.25 -6.5 -22.5 0 -6.5 -20 0 -8 -20 -.25 -8
  [4,16,-22.5,-.25,-6.5,-22.5,0,-6.5,-20,0,-8,-20,-.25,-8],
// 4 16 -20 -.25 -8 -20 0 -8 -14 0 -10 -14 -.25 -10
  [4,16,-20,-.25,-8,-20,0,-8,-14,0,-10,-14,-.25,-10],
// 4 16 -23 -.25 -4 -23 0 -4 -22.5 0 -6.5 -22.5 -.25 -6.5
  [4,16,-23,-.25,-4,-23,0,-4,-22.5,0,-6.5,-22.5,-.25,-6.5],
// 4 16 -6.5 -.25 -20 -6.5 0 -20 0 0 -16 0 -.25 -16
  [4,16,-6.5,-.25,-20,-6.5,0,-20,0,0,-16,0,-.25,-16],
// 4 16 0 -.25 -16 0 0 -16 12 0 -20 12 -.25 -20
  [4,16,0,-.25,-16,0,0,-16,12,0,-20,12,-.25,-20],
// 4 16 -10 -.25 -21 -10 0 -21 -8.5 0 -21 -8.5 -.25 -21
  [4,16,-10,-.25,-21,-10,0,-21,-8.5,0,-21,-8.5,-.25,-21],
// 4 16 -8.5 -.25 -21 -8.5 0 -21 -6.5 0 -20 -6.5 -.25 -20
  [4,16,-8.5,-.25,-21,-8.5,0,-21,-6.5,0,-20,-6.5,-.25,-20],
// 4 16 -15 -.25 -18.5 -15 0 -18.5 -12.5 0 -20 -12.5 -.25 -20
  [4,16,-15,-.25,-18.5,-15,0,-18.5,-12.5,0,-20,-12.5,-.25,-20],
// 4 16 -12.5 -.25 -20 -12.5 0 -20 -10 0 -21 -10 -.25 -21
  [4,16,-12.5,-.25,-20,-12.5,0,-20,-10,0,-21,-10,-.25,-21],
// 4 16 -16.5 -.25 -14 -16.5 0 -14 -16.5 0 -17 -16.5 -.25 -17
  [4,16,-16.5,-.25,-14,-16.5,0,-14,-16.5,0,-17,-16.5,-.25,-17],
// 4 16 -16.5 -.25 -17 -16.5 0 -17 -15 0 -18.5 -15 -.25 -18.5
  [4,16,-16.5,-.25,-17,-16.5,0,-17,-15,0,-18.5,-15,-.25,-18.5],
// 4 16 21 -.25 9 21 0 9 23 0 17 23 -.25 17
  [4,16,21,-.25,9,21,0,9,23,0,17,23,-.25,17],
// 4 16 23 -.25 17 23 0 17 22.5 0 19 22.5 -.25 19
  [4,16,23,-.25,17,23,0,17,22.5,0,19,22.5,-.25,19],
// 4 16 19.5 -.25 -4 19.5 0 -4 17 0 0 17 -.25 0
  [4,16,19.5,-.25,-4,19.5,0,-4,17,0,0,17,-.25,0],
// 4 16 17 -.25 0 17 0 0 21 0 9 21 -.25 9
  [4,16,17,-.25,0,17,0,0,21,0,9,21,-.25,9],
// 4 16 15 -.25 -18 15 0 -18 19 0 -9 19 -.25 -9
  [4,16,15,-.25,-18,15,0,-18,19,0,-9,19,-.25,-9],
// 4 16 19 -.25 -9 19 0 -9 19.5 0 -4 19.5 -.25 -4
  [4,16,19,-.25,-9,19,0,-9,19.5,0,-4,19.5,-.25,-4],
// 4 16 12 -.25 -20 12 0 -20 14 0 -19.5 14 -.25 -19.5
  [4,16,12,-.25,-20,12,0,-20,14,0,-19.5,14,-.25,-19.5],
// 4 16 14 -.25 -19.5 14 0 -19.5 15 0 -18 15 -.25 -18
  [4,16,14,-.25,-19.5,14,0,-19.5,15,0,-18,15,-.25,-18],
// 4 16 4 -.25 15 4 0 15 1.5 0 12 1.5 -.25 12
  [4,16,4,-.25,15,4,0,15,1.5,0,12,1.5,-.25,12],
// 4 16 1.5 -.25 12 1.5 0 12 0 0 8 0 -.25 8
  [4,16,1.5,-.25,12,1.5,0,12,0,0,8,0,-.25,8],
// 4 16 10.5 -.25 19 10.5 0 19 6.5 0 17 6.5 -.25 17
  [4,16,10.5,-.25,19,10.5,0,19,6.5,0,17,6.5,-.25,17],
// 4 16 6.5 -.25 17 6.5 0 17 4 0 15 4 -.25 15
  [4,16,6.5,-.25,17,6.5,0,17,4,0,15,4,-.25,15],
// 4 16 19 -.25 21 19 0 21 14 0 20 14 -.25 20
  [4,16,19,-.25,21,19,0,21,14,0,20,14,-.25,20],
// 4 16 14 -.25 20 14 0 20 10.5 0 19 10.5 -.25 19
  [4,16,14,-.25,20,14,0,20,10.5,0,19,10.5,-.25,19],
// 4 16 22.5 -.25 19 22.5 0 19 21 0 20.5 21 -.25 20.5
  [4,16,22.5,-.25,19,22.5,0,19,21,0,20.5,21,-.25,20.5],
// 4 16 21 -.25 20.5 21 0 20.5 19 0 21 19 -.25 21
  [4,16,21,-.25,20.5,21,0,20.5,19,0,21,19,-.25,21],
// 4 16 -18.5 -.25 1.5 -18.5 0 1.5 -20.5 0 0 -20.5 -.25 0
  [4,16,-18.5,-.25,1.5,-18.5,0,1.5,-20.5,0,0,-20.5,-.25,0],
// 4 16 -20.5 -.25 0 -20.5 0 0 -22.5 0 -2 -22.5 -.25 -2
  [4,16,-20.5,-.25,0,-20.5,0,0,-22.5,0,-2,-22.5,-.25,-2],
// 4 16 -13 -.25 4 -13 0 4 -15.5 0 3 -15.5 -.25 3
  [4,16,-13,-.25,4,-13,0,4,-15.5,0,3,-15.5,-.25,3],
// 4 16 -15.5 -.25 3 -15.5 0 3 -18.5 0 1.5 -18.5 -.25 1.5
  [4,16,-15.5,-.25,3,-15.5,0,3,-18.5,0,1.5,-18.5,-.25,1.5],
// 4 16 -4 -.25 4.5 -4 0 4.5 -10 0 4.5 -10 -.25 4.5
  [4,16,-4,-.25,4.5,-4,0,4.5,-10,0,4.5,-10,-.25,4.5],
// 4 16 -10 -.25 4.5 -10 0 4.5 -13 0 4 -13 -.25 4
  [4,16,-10,-.25,4.5,-10,0,4.5,-13,0,4,-13,-.25,4],
// 4 16 0 -.25 8 0 0 8 -1 0 6 -1 -.25 6
  [4,16,0,-.25,8,0,0,8,-1,0,6,-1,-.25,6],
// 4 16 -1 -.25 6 -1 0 6 -4 0 4.5 -4 -.25 4.5
  [4,16,-1,-.25,6,-1,0,6,-4,0,4.5,-4,-.25,4.5],
// 4 16 -22.5 -.25 -2 -22.5 0 -2 -23 0 -4 -23 -.25 -4
  [4,16,-22.5,-.25,-2,-22.5,0,-2,-23,0,-4,-23,-.25,-4],
// 5 24 -22.5 -.25 -2 -22.5 0 -2 -20.5 0 0 -23 0 -4
  [5,24,-22.5,-.25,-2,-22.5,0,-2,-20.5,0,0,-23,0,-4],
// 5 24 -18.5 -.25 1.5 -18.5 0 1.5 -15.5 0 3 -20.5 0 0
  [5,24,-18.5,-.25,1.5,-18.5,0,1.5,-15.5,0,3,-20.5,0,0],
// 5 24 -20.5 -.25 0 -20.5 0 0 -18.5 0 1.5 -22.5 0 -2
  [5,24,-20.5,-.25,0,-20.5,0,0,-18.5,0,1.5,-22.5,0,-2],
// 5 24 -22.5 -.25 -6.5 -22.5 0 -6.5 -23 0 -4 -20 0 -8
  [5,24,-22.5,-.25,-6.5,-22.5,0,-6.5,-23,0,-4,-20,0,-8],
// 5 24 -20 -.25 -8 -20 0 -8 -22.5 0 -6.5 -14 0 -10
  [5,24,-20,-.25,-8,-20,0,-8,-22.5,0,-6.5,-14,0,-10],
// 5 24 -23 -.25 -4 -23 0 -4 -22.5 0 -6.5 -22.5 0 -2
  [5,24,-23,-.25,-4,-23,0,-4,-22.5,0,-6.5,-22.5,0,-2],
// 5 24 -10 -.25 -21 -10 0 -21 -12.5 0 -20 -8.5 0 -21
  [5,24,-10,-.25,-21,-10,0,-21,-12.5,0,-20,-8.5,0,-21],
// 5 24 -8.5 -.25 -21 -8.5 0 -21 -10 0 -21 -6.5 0 -20
  [5,24,-8.5,-.25,-21,-8.5,0,-21,-10,0,-21,-6.5,0,-20],
// 5 24 -15 -.25 -18.5 -15 0 -18.5 -16.5 0 -17 -12.5 0 -20
  [5,24,-15,-.25,-18.5,-15,0,-18.5,-16.5,0,-17,-12.5,0,-20],
// 5 24 -12.5 -.25 -20 -12.5 0 -20 -15 0 -18.5 -10 0 -21
  [5,24,-12.5,-.25,-20,-12.5,0,-20,-15,0,-18.5,-10,0,-21],
// 5 24 -16.5 -.25 -14 -16.5 0 -14 -15.5 0 -12 -16.5 0 -17
  [5,24,-16.5,-.25,-14,-16.5,0,-14,-15.5,0,-12,-16.5,0,-17],
// 5 24 -16.5 -.25 -17 -16.5 0 -17 -16.5 0 -14 -15 0 -18.5
  [5,24,-16.5,-.25,-17,-16.5,0,-17,-16.5,0,-14,-15,0,-18.5],
// 5 24 -15.5 -.25 -12 -15.5 0 -12 -14 0 -10 -16.5 0 -14
  [5,24,-15.5,-.25,-12,-15.5,0,-12,-14,0,-10,-16.5,0,-14],
// 5 24 19.5 -.25 -4 19.5 0 -4 19 0 -9 17 0 0
  [5,24,19.5,-.25,-4,19.5,0,-4,19,0,-9,17,0,0],
// 5 24 17 -.25 0 17 0 0 19.5 0 -4 21 0 9
  [5,24,17,-.25,0,17,0,0,19.5,0,-4,21,0,9],
// 5 24 15 -.25 -18 15 0 -18 14 0 -19.5 19 0 -9
  [5,24,15,-.25,-18,15,0,-18,14,0,-19.5,19,0,-9],
// 5 24 19 -.25 -9 19 0 -9 15 0 -18 19.5 0 -4
  [5,24,19,-.25,-9,19,0,-9,15,0,-18,19.5,0,-4],
// 5 24 12 -.25 -20 12 0 -20 0 0 -16 14 0 -19.5
  [5,24,12,-.25,-20,12,0,-20,0,0,-16,14,0,-19.5],
// 5 24 14 -.25 -19.5 14 0 -19.5 12 0 -20 15 0 -18
  [5,24,14,-.25,-19.5,14,0,-19.5,12,0,-20,15,0,-18],
// 5 24 -6.5 -.25 -20 -6.5 0 -20 -8.5 0 -21 0 0 -16
  [5,24,-6.5,-.25,-20,-6.5,0,-20,-8.5,0,-21,0,0,-16],
// 5 24 0 -.25 -16 0 0 -16 -6.5 0 -20 12 0 -20
  [5,24,0,-.25,-16,0,0,-16,-6.5,0,-20,12,0,-20],
// 5 24 10.5 -.25 19 10.5 0 19 14 0 20 6.5 0 17
  [5,24,10.5,-.25,19,10.5,0,19,14,0,20,6.5,0,17],
// 5 24 6.5 -.25 17 6.5 0 17 10.5 0 19 4 0 15
  [5,24,6.5,-.25,17,6.5,0,17,10.5,0,19,4,0,15],
// 5 24 19 -.25 21 19 0 21 21 0 20.5 14 0 20
  [5,24,19,-.25,21,19,0,21,21,0,20.5,14,0,20],
// 5 24 14 -.25 20 14 0 20 19 0 21 10.5 0 19
  [5,24,14,-.25,20,14,0,20,19,0,21,10.5,0,19],
// 5 24 22.5 -.25 19 22.5 0 19 23 0 17 21 0 20.5
  [5,24,22.5,-.25,19,22.5,0,19,23,0,17,21,0,20.5],
// 5 24 21 -.25 20.5 21 0 20.5 22.5 0 19 19 0 21
  [5,24,21,-.25,20.5,21,0,20.5,22.5,0,19,19,0,21],
// 5 24 21 -.25 9 21 0 9 17 0 0 23 0 17
  [5,24,21,-.25,9,21,0,9,17,0,0,23,0,17],
// 5 24 23 -.25 17 23 0 17 21 0 9 22.5 0 19
  [5,24,23,-.25,17,23,0,17,21,0,9,22.5,0,19],
// 5 24 -13 -.25 4 -13 0 4 -10 0 4.5 -15.5 0 3
  [5,24,-13,-.25,4,-13,0,4,-10,0,4.5,-15.5,0,3],
// 5 24 -15.5 -.25 3 -15.5 0 3 -13 0 4 -18.5 0 1.5
  [5,24,-15.5,-.25,3,-15.5,0,3,-13,0,4,-18.5,0,1.5],
// 5 24 -4 -.25 4.5 -4 0 4.5 -1 0 6 -10 0 4.5
  [5,24,-4,-.25,4.5,-4,0,4.5,-1,0,6,-10,0,4.5],
// 5 24 -10 -.25 4.5 -10 0 4.5 -4 0 4.5 -13 0 4
  [5,24,-10,-.25,4.5,-10,0,4.5,-4,0,4.5,-13,0,4],
// 5 24 0 -.25 8 0 0 8 1.5 0 12 -1 0 6
  [5,24,0,-.25,8,0,0,8,1.5,0,12,-1,0,6],
// 5 24 -1 -.25 6 -1 0 6 0 0 8 -4 0 4.5
  [5,24,-1,-.25,6,-1,0,6,0,0,8,-4,0,4.5],
// 5 24 4 -.25 15 4 0 15 6.5 0 17 1.5 0 12
  [5,24,4,-.25,15,4,0,15,6.5,0,17,1.5,0,12],
// 5 24 1.5 -.25 12 1.5 0 12 4 0 15 0 0 8
  [5,24,1.5,-.25,12,1.5,0,12,4,0,15,0,0,8],
];
module ldraw_lib__821409c(step=0, col=false, unit=2/5, alt=false, line=0.2, solid=!$preview)
    makepoly(ldraw_lib__821409c(), step=step, col=col, unit=unit, alt=alt, line=line, solid=solid);
ldraw_lib__821409c(line=0.2);
